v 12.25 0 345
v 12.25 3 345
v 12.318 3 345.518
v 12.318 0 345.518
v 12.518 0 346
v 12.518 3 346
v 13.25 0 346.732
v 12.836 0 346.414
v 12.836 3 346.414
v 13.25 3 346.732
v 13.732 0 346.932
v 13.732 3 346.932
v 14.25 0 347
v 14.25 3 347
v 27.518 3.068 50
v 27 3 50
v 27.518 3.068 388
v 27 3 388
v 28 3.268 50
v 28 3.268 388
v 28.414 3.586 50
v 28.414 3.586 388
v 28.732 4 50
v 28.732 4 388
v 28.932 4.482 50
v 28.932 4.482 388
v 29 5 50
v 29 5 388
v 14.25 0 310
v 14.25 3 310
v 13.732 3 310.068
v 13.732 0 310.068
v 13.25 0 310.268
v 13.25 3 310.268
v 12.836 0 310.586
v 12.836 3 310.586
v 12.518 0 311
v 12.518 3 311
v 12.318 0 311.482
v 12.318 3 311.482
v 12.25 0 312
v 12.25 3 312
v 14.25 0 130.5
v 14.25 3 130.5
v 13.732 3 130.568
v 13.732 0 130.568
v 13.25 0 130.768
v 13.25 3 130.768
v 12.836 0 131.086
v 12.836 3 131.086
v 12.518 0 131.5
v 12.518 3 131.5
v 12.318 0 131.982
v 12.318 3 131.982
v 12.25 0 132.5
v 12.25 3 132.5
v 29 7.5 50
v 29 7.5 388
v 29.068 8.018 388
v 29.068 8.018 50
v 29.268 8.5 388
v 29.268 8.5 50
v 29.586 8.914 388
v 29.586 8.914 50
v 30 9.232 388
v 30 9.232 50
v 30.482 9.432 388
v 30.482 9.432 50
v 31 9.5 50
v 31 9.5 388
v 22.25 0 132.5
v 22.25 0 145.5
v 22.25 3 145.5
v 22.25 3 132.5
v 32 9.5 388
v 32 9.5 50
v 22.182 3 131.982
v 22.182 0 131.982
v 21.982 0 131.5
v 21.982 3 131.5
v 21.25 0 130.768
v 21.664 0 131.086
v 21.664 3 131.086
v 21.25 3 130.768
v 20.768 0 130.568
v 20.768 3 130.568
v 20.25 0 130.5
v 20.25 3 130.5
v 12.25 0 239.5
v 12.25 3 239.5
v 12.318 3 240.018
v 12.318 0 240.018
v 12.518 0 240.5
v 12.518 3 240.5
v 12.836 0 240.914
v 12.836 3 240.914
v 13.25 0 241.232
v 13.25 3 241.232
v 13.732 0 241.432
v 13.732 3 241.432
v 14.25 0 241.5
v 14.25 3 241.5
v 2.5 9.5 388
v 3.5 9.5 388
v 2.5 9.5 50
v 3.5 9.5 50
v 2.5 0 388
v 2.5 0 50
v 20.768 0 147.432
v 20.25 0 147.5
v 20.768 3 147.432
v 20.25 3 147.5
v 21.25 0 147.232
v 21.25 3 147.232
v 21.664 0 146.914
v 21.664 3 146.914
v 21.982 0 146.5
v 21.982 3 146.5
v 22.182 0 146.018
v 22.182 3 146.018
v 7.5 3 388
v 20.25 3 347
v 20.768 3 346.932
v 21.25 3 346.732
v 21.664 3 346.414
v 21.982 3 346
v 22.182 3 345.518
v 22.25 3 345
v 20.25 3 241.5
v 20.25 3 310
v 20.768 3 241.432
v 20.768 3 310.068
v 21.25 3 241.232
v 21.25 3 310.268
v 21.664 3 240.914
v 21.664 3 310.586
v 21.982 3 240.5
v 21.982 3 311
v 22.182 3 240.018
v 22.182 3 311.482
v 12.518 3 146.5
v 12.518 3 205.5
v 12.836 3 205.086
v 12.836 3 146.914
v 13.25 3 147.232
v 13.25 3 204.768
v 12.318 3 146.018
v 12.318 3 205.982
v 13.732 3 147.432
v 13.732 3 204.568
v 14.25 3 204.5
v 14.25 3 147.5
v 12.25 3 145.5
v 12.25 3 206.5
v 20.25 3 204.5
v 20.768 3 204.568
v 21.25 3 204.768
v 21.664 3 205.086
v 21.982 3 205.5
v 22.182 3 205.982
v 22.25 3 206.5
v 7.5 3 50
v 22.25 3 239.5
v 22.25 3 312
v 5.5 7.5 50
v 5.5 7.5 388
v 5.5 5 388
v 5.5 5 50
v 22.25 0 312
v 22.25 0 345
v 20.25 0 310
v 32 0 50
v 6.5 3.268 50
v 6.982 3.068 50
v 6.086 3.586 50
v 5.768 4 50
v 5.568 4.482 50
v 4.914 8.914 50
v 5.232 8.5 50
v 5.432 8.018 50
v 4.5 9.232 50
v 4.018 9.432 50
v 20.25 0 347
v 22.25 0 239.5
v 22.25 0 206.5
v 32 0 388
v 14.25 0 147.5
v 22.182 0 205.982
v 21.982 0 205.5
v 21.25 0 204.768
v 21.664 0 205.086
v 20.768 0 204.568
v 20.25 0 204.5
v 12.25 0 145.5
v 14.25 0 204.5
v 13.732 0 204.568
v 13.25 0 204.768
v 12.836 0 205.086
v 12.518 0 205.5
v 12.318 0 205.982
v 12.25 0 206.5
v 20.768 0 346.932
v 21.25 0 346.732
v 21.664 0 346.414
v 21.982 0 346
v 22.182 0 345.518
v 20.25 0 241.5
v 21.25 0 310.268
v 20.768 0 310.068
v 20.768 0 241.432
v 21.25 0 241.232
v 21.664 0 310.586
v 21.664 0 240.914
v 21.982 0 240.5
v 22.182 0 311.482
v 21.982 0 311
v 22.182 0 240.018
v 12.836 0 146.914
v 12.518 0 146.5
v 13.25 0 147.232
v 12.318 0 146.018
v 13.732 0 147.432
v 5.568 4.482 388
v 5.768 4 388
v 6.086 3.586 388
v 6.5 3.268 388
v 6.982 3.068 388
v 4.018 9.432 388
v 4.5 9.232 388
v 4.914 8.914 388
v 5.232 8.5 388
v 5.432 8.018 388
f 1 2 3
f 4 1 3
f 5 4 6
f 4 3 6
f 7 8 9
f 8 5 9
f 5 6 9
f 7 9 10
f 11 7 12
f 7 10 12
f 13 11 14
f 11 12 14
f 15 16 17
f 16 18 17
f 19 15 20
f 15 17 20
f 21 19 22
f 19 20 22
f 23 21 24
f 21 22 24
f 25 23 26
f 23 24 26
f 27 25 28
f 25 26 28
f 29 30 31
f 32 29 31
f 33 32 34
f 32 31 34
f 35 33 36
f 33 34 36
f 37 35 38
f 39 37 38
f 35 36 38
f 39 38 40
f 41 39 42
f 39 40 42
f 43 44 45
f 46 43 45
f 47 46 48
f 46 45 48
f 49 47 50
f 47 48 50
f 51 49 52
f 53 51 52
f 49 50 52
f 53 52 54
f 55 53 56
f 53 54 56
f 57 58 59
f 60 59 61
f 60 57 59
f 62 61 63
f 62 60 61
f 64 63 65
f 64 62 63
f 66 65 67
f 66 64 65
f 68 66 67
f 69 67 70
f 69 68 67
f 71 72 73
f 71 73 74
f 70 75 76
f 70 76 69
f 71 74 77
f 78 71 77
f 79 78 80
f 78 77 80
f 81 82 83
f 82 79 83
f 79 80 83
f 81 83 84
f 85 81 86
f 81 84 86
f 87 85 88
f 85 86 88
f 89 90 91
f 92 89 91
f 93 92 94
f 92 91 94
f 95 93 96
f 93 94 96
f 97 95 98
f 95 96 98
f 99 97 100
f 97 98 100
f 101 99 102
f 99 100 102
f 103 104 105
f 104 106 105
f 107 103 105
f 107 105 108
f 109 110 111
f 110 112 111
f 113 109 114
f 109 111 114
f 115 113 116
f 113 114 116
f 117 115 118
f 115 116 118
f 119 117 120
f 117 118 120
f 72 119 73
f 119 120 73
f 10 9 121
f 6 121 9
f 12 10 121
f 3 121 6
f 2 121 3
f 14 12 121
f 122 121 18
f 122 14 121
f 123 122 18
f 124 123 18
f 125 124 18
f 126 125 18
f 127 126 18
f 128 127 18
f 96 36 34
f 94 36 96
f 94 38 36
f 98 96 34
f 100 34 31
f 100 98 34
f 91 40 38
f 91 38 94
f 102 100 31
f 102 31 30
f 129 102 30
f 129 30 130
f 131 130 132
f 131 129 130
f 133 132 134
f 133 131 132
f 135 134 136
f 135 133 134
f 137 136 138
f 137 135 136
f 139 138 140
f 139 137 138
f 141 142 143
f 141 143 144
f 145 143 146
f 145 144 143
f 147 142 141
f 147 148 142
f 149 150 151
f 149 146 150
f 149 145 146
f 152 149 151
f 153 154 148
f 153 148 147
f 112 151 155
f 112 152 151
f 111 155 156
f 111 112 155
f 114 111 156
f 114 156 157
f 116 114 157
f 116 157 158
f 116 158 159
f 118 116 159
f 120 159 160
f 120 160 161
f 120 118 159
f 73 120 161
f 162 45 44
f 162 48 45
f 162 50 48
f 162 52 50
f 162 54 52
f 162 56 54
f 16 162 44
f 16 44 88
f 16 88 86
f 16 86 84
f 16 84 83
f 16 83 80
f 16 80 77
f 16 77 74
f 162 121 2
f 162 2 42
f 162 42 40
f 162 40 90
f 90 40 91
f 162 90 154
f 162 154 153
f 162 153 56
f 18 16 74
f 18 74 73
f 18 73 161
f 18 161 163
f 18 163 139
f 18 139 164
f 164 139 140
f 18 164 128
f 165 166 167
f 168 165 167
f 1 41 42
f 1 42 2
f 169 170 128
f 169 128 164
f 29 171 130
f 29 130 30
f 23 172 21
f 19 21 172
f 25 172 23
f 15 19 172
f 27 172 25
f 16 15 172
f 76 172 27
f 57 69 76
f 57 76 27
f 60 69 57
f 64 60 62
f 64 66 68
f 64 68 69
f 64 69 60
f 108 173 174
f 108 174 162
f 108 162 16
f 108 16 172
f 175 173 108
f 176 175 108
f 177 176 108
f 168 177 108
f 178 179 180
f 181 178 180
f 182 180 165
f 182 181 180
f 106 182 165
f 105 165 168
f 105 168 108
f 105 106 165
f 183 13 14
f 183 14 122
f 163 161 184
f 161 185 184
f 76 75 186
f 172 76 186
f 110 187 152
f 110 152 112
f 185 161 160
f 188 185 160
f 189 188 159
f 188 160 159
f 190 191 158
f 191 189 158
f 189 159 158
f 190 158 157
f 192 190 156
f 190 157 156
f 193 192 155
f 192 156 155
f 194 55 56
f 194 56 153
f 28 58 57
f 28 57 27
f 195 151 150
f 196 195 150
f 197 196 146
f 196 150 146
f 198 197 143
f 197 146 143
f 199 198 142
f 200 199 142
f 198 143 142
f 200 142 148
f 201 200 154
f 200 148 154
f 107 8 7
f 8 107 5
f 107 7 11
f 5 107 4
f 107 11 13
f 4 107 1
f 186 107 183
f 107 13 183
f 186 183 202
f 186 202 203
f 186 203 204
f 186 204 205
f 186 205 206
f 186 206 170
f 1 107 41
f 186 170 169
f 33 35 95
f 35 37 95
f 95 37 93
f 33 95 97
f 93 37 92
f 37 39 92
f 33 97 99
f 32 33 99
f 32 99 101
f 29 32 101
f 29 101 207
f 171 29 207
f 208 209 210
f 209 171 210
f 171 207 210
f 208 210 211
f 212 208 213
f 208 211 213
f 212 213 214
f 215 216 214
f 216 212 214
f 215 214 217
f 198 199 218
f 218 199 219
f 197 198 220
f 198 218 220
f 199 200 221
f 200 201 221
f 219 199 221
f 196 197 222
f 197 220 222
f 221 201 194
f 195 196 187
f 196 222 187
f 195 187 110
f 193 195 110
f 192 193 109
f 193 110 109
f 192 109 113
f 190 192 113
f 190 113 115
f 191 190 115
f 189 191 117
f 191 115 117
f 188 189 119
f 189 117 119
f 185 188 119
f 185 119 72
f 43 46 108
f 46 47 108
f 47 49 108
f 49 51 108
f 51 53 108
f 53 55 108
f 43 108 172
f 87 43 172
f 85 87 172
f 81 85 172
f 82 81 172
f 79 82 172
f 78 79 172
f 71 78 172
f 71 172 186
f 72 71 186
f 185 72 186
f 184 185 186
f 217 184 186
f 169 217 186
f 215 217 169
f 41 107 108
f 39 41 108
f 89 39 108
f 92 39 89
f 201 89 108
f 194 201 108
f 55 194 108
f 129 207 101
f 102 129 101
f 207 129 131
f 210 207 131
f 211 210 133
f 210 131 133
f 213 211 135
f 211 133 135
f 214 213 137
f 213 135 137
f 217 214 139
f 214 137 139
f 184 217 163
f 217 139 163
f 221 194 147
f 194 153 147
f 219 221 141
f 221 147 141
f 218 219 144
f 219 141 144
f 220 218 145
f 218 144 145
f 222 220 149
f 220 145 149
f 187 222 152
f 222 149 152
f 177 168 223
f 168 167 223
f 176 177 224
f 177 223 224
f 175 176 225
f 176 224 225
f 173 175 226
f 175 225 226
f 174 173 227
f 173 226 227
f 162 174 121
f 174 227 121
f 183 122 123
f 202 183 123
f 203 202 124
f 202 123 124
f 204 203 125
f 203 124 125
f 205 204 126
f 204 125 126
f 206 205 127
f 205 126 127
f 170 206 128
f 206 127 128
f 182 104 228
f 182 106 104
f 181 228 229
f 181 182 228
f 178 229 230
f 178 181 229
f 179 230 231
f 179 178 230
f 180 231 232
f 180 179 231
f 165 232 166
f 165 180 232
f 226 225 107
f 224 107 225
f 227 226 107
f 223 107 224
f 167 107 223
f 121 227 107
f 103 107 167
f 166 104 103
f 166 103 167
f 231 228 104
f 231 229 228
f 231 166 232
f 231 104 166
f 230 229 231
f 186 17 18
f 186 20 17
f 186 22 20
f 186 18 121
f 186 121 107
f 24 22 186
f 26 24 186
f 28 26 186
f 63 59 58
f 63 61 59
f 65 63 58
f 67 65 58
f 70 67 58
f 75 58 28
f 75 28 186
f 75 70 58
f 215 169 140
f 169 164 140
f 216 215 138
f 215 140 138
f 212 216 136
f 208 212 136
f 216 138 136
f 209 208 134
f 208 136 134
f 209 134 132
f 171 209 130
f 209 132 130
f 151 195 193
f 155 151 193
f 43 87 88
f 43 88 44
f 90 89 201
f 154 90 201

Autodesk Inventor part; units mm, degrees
ref_plane "YZ Plane" through (0, 0, 0) normal (1, 0, 0) x (0, 1, 0)
ref_plane "XZ Plane" through (0, 0, 0) normal (0, 1, 0) x (-1, 0, 0)
ref_plane "XY Plane" through (0, 0, 0) normal (0, 0, 1) x (1, 0, 0)
sketch "Эскиз1" plane through (0, 0, 0) normal (0, 0, 1) x (1, 0, 0)
  line L0 (0, 0) -> (34.5, 0)
  line L1 (34.5, 0) -> (34.5, 9.5)
  line L2 (34.5, 9.5) -> (0, 9.5)
  line L3 (0, 9.5) -> (0, 0)
  line L4 (3, 9.5) -> (3, 0)
  line L5 (31.5, 9.5) -> (31.5, 0)
  line L6 (3, 3) -> (31.5, 3)
  dimension "d0" = 34.5
  dimension "d1" = 9.5
  dimension "d2" = 3
  dimension "d3" = 3
  dimension "d4" = 3
extrude "Выдавливание1" add sketch "Эскиз1" along normal blind 388 contours L3 L2 L4 L0 | L4 L6 L5 L0 | L5 L2 L1 L0
sketch "Эскиз2" plane through (0, 0, 0) normal (0, -1, 0) x (1, 0, 0)
  line L0 (0, 0) -> (34.5, 0) projected
  line L1 (34.5, 0) -> (34.5, 388) projected
  line L2 (0, 388) -> (34.5, 388) projected
  line L3 (0, 0) -> (0, 388) projected
  line L4 (17.25, 388) -> (17.25, 0)
  line L5 (22.25, 310) -> (12.25, 310)
  line L6 (12.25, 310) -> (12.25, 347)
  line L7 (12.25, 347) -> (22.25, 347)
  line L8 (22.25, 347) -> (22.25, 310)
  line L9 (22.25, 310) -> (12.25, 347) construction
  line L10 (12.25, 310) -> (22.25, 347) construction
  line L11 (12.25, 204.5) -> (22.25, 204.5)
  line L12 (22.25, 204.5) -> (22.25, 241.5)
  line L13 (22.25, 241.5) -> (12.25, 241.5)
  line L14 (12.25, 241.5) -> (12.25, 204.5)
  line L15 (12.25, 204.5) -> (22.25, 241.5) construction
  line L16 (22.25, 204.5) -> (12.25, 241.5) construction
  line L17 (22.25, 130.5) -> (12.25, 130.5)
  line L18 (12.25, 130.5) -> (12.25, 147.5)
  line L19 (12.25, 147.5) -> (22.25, 147.5)
  line L20 (22.25, 147.5) -> (22.25, 130.5)
  line L21 (22.25, 130.5) -> (12.25, 147.5) construction
  line L22 (12.25, 130.5) -> (22.25, 147.5) construction
  point P0 (17.25, 328.5)
  point P1 (17.25, 223)
  point P2 (17.25, 139)
  dimension "d8" = 10
  dimension "d9" = 37
  dimension "d10" = 41
  dimension "d11" = 10
  dimension "d12" = 37
  dimension "d13" = 68.5
  dimension "d14" = 10
  dimension "d15" = 17
  dimension "d16" = 57
extrude "Выдавливание2" cut sketch "Эскиз2" against normal blind 295 contours L17 L18 L19 L4 | L4 L19 L20 L17 | L7 L8 L5 L4 | L4 L5 L6 L7 | L11 L14 L13 L4 | L4 L13 L12 L11
fillet "Сопряжение2" radius 2 12 edges at (12.25, 1.5, 241.5) (12.25, 1.5, 204.5) (22.25, 1.5, 204.5) (22.25, 1.5, 241.5) (22.25, 1.5, 147.5) (22.25, 1.5, 130.5) (12.25, 1.5, 147.5) (12.25, 1.5, 130.5) (12.25, 1.5, 310) (12.25, 1.5, 347) (22.25, 1.5, 347) (22.25, 1.5, 310)
sketch "Эскиз3" plane through (0, 0, 388) normal (0, 0, 1) x (1, 0, 0)
  line L0 (3, 3) -> (3, 9.5) projected
  line L1 (3, 9.5) -> (5.5, 9.5)
  line L2 (5.5, 9.5) -> (5.5, 0)
  line L3 (5.5, 0) -> (3, 0)
  line L4 (3, 0) -> (3, 9.5)
  line L5 (31.5, 9.5) -> (31.5, 3) projected
  line L6 (31.5, 9.5) -> (29, 9.5)
  line L7 (29, 9.5) -> (29, 0)
  line L8 (29, 0) -> (31.5, 0)
  line L9 (31.5, 0) -> (31.5, 9.5)
  point P0 (0, 0)
  dimension "d20" = 2.5
  dimension "d21" = 2.5
extrude "Выдавливание3" add sketch "Эскиз3" against normal up to surface (388 mm away)
sketch "Эскиз4" plane through (0, 0, 0) normal (0, 0, -1) x (-1, 0, 0)
  line L0 (-34.5, 9.5) -> (-29, 9.5) projected
  line L1 (0, 0) -> (-34.5, 0) projected
  line L2 (-34.5, 9.5) -> (-32, 9.5)
  line L3 (-32, 9.5) -> (-32, 0)
  line L4 (-32, 0) -> (-34.5, 0)
  line L5 (-34.5, 0) -> (-34.5, 9.5)
  line L6 (0, 9.5) -> (0, 0) projected
  line L7 (0, 9.5) -> (-2.5, 9.5)
  line L8 (-2.5, 9.5) -> (-2.5, 0)
  line L9 (-2.5, 0) -> (0, 0)
  line L10 (0, 0) -> (0, 9.5)
  dimension "d24" = 2.5
  dimension "d25" = 2.5
extrude "Выдавливание4" cut sketch "Эскиз4" against normal through all
fillet "Сопряжение3" radius 2 4 edges at (5.5, 3, 194) (29, 3, 194) (29, 9.5, 194) (5.5, 9.5, 194)
sketch "Эскиз5" plane through (0, 0, 0) normal (0, 0, -1) x (-1, 0, 0)
  line L0 (52, 100) -> (-112, 100)
  line L1 (-112, 100) -> (-112, -123)
  line L2 (-112, -123) -> (52, -123)
  line L3 (52, -123) -> (52, 100)
  point P0 (0, 0)
extrude "Выдавливание5" cut sketch "Эскиз5" against normal blind 50
properties part number "2 часть направляшки 35"
